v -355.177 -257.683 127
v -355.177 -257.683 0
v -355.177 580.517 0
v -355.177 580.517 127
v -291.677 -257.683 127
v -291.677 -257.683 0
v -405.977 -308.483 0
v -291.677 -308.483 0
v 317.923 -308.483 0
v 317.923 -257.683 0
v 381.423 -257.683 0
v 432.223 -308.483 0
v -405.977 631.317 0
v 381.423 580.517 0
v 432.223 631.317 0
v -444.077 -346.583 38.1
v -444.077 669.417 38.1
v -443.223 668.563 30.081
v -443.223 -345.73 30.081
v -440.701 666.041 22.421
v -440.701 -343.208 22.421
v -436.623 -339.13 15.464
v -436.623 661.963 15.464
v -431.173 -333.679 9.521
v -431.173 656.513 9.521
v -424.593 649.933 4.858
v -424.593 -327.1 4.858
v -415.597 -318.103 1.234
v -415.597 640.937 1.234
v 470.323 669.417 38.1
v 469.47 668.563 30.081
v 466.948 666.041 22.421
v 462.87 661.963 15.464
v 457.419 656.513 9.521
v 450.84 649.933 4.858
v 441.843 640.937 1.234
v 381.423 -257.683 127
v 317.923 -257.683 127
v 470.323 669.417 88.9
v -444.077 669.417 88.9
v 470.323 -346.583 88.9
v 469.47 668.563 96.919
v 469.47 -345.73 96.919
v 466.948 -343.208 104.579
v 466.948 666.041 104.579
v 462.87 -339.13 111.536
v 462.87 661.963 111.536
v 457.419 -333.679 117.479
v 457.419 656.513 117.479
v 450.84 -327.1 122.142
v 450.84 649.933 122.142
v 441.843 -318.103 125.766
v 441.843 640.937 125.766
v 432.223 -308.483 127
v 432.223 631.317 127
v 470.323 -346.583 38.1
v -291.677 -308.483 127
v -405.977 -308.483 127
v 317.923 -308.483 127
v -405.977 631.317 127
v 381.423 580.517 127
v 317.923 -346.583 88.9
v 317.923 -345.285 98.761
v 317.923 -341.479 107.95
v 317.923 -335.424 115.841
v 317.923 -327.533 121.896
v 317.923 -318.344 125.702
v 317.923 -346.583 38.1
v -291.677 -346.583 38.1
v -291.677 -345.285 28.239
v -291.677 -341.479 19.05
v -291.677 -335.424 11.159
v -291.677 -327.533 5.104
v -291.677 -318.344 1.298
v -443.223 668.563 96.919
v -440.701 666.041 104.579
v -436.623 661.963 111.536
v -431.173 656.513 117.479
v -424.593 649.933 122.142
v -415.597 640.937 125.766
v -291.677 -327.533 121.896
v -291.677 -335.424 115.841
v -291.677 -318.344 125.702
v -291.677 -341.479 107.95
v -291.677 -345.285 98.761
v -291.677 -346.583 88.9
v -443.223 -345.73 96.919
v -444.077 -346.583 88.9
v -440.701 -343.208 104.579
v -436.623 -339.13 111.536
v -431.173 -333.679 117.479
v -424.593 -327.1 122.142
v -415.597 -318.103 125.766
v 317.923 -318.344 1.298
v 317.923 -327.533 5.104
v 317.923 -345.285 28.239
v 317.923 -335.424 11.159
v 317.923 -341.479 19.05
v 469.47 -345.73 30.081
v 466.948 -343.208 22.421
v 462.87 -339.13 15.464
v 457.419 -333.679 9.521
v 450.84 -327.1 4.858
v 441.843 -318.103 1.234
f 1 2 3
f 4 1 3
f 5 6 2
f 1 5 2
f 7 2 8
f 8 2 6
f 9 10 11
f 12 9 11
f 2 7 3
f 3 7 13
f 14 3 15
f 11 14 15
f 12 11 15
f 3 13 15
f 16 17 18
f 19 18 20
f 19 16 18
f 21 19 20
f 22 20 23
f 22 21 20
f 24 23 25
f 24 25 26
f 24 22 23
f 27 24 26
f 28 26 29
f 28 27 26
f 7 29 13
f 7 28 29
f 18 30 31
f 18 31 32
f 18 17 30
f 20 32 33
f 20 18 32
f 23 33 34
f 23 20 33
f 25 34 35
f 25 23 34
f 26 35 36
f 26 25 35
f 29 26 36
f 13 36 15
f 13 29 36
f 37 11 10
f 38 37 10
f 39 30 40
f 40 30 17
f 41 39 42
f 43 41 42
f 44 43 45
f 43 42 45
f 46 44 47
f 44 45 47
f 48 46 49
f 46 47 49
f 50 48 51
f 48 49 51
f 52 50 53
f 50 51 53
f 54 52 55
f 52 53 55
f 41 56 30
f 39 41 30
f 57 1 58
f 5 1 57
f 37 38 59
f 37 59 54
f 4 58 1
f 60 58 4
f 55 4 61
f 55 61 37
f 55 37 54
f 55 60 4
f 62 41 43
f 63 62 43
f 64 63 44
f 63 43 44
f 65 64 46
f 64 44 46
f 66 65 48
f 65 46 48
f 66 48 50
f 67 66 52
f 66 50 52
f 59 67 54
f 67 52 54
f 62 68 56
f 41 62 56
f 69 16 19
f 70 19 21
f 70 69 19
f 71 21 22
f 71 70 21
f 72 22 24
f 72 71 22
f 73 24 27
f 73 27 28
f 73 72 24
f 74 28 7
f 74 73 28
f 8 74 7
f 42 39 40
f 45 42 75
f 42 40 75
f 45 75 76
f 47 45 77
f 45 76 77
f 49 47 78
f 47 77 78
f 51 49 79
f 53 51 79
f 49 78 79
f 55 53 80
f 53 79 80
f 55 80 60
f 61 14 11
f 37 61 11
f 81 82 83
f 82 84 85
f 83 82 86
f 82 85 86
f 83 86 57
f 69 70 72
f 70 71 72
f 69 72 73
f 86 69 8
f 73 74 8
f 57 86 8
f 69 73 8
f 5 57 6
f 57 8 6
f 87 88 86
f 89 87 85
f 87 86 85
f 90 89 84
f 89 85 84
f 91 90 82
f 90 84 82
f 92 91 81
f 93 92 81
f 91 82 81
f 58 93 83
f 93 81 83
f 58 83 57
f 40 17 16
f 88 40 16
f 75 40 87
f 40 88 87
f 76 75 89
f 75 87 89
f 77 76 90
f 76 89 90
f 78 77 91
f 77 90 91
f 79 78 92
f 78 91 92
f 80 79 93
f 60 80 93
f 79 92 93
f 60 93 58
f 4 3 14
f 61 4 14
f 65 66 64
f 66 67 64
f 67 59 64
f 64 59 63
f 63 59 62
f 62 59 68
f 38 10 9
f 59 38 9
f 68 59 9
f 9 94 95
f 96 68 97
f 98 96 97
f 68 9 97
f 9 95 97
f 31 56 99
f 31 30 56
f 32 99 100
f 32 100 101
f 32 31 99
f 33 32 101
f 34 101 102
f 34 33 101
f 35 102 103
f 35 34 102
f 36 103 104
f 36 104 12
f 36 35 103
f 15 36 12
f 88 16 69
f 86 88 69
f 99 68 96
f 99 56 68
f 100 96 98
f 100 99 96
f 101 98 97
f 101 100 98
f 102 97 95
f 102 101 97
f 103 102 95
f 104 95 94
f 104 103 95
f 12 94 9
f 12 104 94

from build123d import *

# Parameters (mm, degrees)
F1_DEPTH = 127
F2_R     = 38.1


with BuildPart() as f1:
    # F0 (on Top) → F1 (new body)
    with BuildSketch(Plane.XY):
        Polygon((470.323251, 669.416738), (-444.076749, 669.416738), (-444.076749, -346.583262), (-291.676749, -346.583262), (-291.676749, -257.683262), (-355.176749, -257.683262), (-355.176749, 580.516738), (381.423251, 580.516738), (381.423251, -257.683262), (317.923251, -257.683262), (317.923251, -346.583262), (470.323251, -346.583262), align=None)
    extrude(amount=F1_DEPTH)

    # F2
    f2_edges = [f1.edges().sort_by_distance(p)[0] for p in [
        (13.123251, 669.416738, 0),
        (13.123251, 669.416738, 127),
        (470.323251, 161.416738, 127),
        (470.323251, 161.416738, 0),
        (-444.076749, 161.416738, 0),
        (-444.076749, 161.416738, 127),
        (-367.876749, -346.583262, 0),
        (-367.876749, -346.583262, 127),
        (394.123251, -346.583262, 127),
        (394.123251, -346.583262, 0),
    ]]
    fillet(f2_edges, radius=F2_R)


solid = f1.part
